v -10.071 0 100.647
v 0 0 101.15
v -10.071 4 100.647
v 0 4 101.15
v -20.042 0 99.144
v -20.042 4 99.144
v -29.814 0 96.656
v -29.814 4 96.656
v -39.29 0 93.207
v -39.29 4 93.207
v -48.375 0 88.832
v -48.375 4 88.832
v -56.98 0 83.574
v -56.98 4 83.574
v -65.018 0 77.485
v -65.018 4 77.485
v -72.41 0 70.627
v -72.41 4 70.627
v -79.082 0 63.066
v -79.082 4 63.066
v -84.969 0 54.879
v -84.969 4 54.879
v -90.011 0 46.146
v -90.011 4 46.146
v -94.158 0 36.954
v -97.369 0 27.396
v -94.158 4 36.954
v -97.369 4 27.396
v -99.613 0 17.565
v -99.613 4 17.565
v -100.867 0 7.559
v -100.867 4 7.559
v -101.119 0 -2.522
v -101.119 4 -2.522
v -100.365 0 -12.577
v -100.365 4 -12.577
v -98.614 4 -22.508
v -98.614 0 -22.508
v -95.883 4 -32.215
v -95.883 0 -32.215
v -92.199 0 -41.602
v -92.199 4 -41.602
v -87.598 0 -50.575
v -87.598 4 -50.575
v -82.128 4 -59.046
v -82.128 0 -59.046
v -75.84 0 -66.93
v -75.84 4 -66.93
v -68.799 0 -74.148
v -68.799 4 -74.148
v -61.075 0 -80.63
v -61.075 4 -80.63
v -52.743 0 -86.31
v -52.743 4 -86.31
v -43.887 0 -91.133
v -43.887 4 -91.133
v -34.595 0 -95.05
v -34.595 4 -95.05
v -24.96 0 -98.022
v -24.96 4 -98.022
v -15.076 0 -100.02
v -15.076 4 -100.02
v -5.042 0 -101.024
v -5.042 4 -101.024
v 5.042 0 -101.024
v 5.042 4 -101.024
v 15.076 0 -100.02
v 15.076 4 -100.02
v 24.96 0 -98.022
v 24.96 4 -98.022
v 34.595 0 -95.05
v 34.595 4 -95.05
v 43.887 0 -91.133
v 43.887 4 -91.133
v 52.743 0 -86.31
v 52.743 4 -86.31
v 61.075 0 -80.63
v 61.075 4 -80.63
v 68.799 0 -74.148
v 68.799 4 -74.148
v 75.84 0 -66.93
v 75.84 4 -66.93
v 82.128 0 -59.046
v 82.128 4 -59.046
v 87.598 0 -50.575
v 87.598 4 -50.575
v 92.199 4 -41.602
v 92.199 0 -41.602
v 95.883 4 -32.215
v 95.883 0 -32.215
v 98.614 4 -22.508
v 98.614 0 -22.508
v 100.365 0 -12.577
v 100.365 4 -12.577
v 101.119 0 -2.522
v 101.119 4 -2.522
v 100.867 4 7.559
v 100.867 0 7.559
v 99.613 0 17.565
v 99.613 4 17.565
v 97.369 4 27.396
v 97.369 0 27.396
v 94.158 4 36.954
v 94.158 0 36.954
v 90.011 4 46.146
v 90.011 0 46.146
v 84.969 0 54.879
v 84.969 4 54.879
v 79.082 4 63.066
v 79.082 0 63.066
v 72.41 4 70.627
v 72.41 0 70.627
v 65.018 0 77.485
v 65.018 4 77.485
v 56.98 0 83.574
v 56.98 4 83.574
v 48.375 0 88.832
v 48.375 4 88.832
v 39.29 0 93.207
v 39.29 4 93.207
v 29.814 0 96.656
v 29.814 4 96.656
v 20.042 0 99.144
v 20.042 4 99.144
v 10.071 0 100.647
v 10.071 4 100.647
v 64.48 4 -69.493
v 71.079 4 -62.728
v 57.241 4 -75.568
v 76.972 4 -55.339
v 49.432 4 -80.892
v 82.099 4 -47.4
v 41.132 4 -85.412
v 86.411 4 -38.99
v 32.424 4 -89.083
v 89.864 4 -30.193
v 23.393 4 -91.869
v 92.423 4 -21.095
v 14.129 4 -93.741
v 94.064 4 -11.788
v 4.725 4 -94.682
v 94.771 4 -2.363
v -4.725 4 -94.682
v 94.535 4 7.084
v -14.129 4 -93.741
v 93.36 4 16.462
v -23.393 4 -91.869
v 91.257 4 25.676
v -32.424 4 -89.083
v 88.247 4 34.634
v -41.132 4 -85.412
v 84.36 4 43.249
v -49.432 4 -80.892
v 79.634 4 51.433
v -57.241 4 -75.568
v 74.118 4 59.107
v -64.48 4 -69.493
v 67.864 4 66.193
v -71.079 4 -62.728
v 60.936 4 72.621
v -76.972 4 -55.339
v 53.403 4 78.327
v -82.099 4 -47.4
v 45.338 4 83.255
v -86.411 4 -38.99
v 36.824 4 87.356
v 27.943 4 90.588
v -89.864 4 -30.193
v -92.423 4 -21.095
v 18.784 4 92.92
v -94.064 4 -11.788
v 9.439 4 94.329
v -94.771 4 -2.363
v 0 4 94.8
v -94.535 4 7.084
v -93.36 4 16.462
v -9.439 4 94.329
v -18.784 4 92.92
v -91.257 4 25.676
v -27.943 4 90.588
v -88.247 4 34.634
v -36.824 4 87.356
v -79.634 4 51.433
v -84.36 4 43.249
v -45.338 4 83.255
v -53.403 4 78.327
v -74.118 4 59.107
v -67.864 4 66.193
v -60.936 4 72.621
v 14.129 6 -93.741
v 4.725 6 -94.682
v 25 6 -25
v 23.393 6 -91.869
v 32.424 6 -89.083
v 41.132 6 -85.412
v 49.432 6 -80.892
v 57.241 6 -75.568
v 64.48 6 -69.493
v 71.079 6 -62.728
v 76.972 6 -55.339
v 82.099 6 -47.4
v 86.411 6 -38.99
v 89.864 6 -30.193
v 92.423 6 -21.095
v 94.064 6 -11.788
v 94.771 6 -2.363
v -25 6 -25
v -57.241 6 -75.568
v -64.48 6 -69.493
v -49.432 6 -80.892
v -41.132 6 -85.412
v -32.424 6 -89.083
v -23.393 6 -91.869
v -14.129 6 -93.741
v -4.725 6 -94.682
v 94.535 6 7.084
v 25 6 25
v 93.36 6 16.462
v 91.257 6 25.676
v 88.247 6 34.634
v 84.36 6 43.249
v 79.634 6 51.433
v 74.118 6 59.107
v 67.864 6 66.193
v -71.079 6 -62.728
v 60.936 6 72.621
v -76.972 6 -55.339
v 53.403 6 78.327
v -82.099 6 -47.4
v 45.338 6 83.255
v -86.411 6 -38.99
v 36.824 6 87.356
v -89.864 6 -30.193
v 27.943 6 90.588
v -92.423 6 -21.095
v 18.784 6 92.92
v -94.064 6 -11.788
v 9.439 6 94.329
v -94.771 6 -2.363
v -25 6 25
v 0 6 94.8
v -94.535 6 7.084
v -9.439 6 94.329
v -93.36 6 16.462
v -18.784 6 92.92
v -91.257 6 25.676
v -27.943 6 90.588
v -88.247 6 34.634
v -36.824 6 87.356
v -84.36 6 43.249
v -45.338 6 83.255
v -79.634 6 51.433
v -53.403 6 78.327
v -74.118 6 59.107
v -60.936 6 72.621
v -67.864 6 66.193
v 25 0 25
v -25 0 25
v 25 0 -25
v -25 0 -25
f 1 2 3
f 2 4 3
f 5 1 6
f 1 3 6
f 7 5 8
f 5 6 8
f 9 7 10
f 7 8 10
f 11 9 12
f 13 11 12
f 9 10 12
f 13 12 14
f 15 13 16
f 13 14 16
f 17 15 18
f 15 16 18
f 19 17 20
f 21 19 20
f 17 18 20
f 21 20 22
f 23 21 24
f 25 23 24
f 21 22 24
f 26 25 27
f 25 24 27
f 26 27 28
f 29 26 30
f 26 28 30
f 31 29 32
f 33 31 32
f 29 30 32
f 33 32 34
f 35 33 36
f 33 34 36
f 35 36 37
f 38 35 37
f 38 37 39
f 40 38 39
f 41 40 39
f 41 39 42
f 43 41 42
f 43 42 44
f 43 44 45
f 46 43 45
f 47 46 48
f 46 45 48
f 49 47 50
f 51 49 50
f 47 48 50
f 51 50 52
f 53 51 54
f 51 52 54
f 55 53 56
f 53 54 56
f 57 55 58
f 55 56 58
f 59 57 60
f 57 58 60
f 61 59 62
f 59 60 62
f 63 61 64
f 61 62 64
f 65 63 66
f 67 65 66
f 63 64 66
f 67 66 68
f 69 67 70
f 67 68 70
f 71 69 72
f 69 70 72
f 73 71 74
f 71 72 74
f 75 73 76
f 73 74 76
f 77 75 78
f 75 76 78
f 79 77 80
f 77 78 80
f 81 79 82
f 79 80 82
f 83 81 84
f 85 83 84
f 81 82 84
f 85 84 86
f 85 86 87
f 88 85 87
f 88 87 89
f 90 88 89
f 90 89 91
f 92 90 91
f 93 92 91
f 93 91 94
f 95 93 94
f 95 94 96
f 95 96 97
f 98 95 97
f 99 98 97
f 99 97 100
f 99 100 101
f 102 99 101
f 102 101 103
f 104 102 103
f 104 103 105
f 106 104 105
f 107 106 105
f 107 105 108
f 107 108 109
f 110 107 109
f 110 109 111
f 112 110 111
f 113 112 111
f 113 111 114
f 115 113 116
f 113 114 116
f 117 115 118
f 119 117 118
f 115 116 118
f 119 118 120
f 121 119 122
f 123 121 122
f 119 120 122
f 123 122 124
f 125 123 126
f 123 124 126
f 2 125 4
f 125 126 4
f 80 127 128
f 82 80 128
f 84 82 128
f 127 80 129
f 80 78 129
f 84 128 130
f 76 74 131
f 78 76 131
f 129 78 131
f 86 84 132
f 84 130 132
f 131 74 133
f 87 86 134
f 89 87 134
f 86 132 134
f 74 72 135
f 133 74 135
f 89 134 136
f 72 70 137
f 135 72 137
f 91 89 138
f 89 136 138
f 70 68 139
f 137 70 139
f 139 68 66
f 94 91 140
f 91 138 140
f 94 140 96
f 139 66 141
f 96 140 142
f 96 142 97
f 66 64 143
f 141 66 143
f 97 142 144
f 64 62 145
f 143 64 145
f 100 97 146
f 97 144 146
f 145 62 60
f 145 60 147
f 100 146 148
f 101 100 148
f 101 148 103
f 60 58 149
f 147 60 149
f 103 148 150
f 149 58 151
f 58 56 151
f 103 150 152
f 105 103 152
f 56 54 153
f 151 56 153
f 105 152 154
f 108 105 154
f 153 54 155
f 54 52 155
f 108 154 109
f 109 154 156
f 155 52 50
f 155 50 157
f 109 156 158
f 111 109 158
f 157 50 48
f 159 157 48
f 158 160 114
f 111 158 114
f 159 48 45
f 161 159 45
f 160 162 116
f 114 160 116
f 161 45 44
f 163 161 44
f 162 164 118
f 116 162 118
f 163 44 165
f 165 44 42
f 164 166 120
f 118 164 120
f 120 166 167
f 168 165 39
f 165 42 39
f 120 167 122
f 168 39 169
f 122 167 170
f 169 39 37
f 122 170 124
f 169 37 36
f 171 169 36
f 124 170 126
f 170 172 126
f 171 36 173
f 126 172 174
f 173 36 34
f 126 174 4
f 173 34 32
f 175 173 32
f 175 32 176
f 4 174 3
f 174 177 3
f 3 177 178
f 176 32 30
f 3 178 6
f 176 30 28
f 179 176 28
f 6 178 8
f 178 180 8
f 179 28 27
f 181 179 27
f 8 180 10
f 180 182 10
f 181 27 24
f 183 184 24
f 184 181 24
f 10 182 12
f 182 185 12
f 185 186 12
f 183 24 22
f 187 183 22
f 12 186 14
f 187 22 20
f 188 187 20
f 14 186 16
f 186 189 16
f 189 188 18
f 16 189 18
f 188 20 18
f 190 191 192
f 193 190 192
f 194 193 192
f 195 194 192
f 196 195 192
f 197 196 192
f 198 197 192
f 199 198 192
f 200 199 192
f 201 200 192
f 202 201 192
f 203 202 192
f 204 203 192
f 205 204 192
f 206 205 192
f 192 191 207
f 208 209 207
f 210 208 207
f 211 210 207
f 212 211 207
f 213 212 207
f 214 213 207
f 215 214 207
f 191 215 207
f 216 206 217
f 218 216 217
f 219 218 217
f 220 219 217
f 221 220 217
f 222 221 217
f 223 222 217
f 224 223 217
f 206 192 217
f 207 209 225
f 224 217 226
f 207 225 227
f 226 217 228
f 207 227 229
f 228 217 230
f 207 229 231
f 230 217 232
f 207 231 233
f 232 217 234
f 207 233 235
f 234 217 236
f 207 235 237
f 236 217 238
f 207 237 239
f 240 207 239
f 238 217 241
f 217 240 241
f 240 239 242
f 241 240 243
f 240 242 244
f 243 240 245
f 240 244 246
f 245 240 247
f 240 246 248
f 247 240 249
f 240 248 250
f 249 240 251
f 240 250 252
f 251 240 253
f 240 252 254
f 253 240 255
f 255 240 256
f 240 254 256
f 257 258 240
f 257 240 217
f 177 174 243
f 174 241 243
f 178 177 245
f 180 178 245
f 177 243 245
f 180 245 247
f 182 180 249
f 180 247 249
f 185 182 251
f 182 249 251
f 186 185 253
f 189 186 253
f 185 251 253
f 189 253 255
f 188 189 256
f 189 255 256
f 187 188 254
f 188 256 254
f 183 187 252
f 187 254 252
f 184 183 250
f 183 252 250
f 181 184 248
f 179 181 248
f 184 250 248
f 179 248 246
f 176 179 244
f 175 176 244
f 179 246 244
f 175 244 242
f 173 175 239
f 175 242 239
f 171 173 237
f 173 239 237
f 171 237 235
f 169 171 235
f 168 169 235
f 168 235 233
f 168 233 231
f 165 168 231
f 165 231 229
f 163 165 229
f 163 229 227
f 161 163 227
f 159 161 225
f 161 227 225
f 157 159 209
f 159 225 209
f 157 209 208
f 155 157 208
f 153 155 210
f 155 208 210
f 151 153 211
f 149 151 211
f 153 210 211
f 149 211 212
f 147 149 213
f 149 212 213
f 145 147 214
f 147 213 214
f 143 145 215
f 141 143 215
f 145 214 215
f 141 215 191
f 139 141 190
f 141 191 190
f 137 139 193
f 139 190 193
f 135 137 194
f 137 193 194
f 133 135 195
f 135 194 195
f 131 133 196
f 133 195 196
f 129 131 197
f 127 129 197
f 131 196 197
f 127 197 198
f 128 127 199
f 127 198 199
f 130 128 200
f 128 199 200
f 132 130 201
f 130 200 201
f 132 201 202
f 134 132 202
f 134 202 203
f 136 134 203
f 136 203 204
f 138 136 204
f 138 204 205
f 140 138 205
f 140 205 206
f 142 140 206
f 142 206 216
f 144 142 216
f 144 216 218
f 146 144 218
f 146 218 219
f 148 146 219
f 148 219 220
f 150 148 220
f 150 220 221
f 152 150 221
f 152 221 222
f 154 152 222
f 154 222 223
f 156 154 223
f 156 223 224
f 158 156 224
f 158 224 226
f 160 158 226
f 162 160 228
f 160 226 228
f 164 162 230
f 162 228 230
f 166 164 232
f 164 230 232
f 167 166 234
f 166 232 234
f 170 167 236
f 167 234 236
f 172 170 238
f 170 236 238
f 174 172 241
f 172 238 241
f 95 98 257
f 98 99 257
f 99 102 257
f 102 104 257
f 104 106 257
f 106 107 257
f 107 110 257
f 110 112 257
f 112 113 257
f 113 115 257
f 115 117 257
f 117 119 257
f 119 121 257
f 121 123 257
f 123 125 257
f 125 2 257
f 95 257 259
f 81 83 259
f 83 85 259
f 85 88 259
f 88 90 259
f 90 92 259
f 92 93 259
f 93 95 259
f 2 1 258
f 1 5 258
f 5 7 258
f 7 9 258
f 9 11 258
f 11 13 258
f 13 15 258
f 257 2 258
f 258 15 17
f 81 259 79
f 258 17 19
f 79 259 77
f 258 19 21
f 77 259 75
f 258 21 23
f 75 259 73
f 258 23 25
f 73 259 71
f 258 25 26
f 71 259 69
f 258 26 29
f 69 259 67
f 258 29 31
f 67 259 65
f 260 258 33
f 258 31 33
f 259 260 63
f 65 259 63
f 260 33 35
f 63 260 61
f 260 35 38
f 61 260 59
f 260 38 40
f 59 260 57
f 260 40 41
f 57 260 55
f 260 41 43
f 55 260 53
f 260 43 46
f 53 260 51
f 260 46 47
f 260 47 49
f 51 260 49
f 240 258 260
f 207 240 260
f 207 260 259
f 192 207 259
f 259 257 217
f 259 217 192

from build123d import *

# Parameters (mm, degrees)
SKETCH2_W          = 50
SKETCH2_H          = 50
CUT_EXTRUDE1_DEPTH = 10


with BuildPart() as part:
    # Sketch1 → Revolve1 (revolve)
    with BuildSketch(Plane.XY, mode=Mode.PRIVATE) as revolve1_sk:
        Polygon((0, 0), (-101.15, 0), (-101.15, 4), (-94.8, 4), (-94.8, 6), (0, 6), align=None)
    revolve(revolve1_sk.sketch.rotate(Axis((0, 6, 0), (0, -1, 0)), 270), axis=Axis((0, 6, 0), (0, -1, 0)))

    # Sketch2 → Cut-Extrude1 (cut)
    with BuildSketch(Plane(origin=(0, 0, 0), x_dir=(1, 0, 0), z_dir=(0, 1, 0))):
        Rectangle(SKETCH2_W, SKETCH2_H)
    extrude(amount=CUT_EXTRUDE1_DEPTH, mode=Mode.SUBTRACT)


solid = part.part
